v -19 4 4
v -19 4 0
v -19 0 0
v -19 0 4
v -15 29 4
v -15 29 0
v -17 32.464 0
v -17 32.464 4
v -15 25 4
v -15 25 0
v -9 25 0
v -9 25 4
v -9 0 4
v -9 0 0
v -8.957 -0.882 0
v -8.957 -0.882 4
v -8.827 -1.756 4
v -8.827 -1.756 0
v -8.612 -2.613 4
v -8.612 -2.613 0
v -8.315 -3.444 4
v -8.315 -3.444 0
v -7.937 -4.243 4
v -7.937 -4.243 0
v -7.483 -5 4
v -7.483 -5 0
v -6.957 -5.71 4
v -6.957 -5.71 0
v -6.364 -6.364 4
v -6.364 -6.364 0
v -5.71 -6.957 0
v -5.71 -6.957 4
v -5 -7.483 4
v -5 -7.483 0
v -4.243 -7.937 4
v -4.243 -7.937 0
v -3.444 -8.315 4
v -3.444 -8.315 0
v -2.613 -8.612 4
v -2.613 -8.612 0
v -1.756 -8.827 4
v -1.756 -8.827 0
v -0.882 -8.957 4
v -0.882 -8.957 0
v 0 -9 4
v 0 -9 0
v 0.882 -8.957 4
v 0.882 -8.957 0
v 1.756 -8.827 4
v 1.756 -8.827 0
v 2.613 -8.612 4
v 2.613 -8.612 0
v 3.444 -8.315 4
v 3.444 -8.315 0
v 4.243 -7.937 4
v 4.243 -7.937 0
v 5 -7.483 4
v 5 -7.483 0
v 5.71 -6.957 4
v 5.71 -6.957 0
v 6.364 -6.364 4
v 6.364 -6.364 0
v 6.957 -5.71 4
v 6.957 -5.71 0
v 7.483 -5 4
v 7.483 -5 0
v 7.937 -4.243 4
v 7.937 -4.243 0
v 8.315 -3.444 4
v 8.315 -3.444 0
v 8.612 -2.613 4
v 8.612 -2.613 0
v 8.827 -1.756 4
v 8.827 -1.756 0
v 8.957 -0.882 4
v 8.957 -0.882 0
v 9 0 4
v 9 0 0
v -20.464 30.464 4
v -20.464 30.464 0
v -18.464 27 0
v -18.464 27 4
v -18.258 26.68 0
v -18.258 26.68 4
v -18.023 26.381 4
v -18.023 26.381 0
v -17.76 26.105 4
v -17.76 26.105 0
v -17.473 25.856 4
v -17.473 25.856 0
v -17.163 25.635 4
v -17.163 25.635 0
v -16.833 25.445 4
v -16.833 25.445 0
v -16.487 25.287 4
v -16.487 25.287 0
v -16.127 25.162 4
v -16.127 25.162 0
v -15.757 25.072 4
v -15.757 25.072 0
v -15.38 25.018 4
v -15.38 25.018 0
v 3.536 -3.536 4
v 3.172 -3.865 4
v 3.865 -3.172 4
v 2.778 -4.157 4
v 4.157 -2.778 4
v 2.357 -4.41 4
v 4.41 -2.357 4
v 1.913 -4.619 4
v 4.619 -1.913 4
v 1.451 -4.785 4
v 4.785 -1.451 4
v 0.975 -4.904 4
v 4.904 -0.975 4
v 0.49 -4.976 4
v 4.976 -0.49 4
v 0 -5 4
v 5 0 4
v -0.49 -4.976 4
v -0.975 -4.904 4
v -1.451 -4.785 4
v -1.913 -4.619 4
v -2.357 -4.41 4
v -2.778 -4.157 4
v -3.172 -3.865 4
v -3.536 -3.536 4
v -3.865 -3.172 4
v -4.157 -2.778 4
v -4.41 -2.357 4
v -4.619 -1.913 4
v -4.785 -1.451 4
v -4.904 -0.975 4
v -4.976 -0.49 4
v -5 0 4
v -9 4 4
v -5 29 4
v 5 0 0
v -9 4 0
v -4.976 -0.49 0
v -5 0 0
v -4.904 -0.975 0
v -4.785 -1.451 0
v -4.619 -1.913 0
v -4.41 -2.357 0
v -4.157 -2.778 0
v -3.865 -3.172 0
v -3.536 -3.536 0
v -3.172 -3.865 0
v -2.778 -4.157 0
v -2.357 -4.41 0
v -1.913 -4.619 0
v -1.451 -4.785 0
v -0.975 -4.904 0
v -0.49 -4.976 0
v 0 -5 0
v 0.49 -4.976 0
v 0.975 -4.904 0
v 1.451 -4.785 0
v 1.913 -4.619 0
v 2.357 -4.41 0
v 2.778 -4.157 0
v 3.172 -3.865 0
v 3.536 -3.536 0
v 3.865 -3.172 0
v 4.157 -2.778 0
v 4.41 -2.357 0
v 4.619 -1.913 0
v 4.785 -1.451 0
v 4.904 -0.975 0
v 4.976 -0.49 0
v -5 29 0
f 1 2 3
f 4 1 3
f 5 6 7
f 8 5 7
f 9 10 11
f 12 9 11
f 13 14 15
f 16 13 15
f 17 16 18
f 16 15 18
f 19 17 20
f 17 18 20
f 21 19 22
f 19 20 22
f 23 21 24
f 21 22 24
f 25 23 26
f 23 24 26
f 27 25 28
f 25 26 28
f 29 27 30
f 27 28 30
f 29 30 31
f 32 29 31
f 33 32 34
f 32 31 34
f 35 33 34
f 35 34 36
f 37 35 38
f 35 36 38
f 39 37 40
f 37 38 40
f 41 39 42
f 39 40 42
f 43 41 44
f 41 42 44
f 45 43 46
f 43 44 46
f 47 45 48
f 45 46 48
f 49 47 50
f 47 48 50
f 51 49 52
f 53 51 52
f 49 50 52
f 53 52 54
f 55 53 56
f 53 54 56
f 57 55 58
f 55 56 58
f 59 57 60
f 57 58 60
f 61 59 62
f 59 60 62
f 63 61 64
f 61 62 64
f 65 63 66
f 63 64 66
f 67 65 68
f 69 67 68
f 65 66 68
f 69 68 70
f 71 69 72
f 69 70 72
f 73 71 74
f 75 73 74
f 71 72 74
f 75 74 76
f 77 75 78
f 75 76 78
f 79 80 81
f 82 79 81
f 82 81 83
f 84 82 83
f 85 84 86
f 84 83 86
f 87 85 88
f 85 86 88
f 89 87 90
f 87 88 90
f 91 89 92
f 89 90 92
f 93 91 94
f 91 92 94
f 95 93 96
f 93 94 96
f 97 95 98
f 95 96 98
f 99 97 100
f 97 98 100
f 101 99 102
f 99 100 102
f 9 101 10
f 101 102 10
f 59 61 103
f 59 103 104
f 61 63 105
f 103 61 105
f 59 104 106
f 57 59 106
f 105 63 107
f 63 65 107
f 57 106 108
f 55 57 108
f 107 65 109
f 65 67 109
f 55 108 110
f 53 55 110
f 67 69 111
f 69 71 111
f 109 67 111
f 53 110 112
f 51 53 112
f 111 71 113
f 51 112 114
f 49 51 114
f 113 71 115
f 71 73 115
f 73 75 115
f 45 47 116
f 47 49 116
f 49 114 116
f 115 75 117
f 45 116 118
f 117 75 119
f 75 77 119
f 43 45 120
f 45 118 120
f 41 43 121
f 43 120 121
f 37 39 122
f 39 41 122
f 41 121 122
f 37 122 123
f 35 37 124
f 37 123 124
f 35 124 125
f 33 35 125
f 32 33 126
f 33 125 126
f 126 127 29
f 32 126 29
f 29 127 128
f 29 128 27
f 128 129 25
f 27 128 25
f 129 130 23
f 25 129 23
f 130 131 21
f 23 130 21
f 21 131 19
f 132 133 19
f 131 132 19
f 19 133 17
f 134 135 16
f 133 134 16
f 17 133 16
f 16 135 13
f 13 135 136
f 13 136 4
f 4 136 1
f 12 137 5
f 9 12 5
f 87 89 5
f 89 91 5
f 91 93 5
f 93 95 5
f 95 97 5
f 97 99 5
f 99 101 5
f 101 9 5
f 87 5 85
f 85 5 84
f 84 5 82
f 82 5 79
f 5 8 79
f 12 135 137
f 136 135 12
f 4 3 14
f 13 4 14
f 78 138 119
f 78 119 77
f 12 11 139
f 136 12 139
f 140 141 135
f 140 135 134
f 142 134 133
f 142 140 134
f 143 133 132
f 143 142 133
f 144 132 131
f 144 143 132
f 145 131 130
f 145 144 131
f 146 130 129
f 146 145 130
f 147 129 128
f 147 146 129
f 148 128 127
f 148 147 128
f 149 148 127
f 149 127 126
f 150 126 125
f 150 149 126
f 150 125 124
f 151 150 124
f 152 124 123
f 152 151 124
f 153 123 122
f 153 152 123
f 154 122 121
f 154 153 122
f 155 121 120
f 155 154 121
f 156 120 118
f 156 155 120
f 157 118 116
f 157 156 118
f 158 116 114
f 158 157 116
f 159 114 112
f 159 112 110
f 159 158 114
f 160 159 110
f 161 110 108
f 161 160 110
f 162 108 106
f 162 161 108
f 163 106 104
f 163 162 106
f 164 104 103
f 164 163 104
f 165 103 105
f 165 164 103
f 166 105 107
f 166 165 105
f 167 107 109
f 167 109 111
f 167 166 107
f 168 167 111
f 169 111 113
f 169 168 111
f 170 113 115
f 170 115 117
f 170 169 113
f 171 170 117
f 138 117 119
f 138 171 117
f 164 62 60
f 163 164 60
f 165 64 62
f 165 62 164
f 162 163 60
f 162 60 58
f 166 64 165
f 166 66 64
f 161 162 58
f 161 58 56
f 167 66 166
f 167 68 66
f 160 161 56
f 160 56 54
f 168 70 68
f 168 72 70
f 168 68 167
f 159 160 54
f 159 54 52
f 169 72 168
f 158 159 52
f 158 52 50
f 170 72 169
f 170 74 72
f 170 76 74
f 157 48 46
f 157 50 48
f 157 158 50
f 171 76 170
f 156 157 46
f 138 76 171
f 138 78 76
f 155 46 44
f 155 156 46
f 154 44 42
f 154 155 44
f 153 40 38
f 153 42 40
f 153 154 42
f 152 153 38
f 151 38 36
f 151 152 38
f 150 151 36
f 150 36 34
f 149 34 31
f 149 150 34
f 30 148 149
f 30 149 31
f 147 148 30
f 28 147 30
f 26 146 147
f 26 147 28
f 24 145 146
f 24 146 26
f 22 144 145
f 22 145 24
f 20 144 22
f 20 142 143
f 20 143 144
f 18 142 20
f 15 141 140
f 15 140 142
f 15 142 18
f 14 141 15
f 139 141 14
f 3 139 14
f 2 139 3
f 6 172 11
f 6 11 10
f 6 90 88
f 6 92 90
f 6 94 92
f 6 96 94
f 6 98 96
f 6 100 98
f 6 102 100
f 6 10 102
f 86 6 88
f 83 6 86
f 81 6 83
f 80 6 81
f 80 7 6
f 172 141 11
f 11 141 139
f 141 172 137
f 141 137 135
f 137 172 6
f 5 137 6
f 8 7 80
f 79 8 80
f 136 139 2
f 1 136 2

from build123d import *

# Parameters (mm, degrees)
PAD_DEPTH = 4


with BuildPart() as part:
    # Sketch → Pad (new body)
    with BuildSketch(Plane.XY):
        with BuildLine():
            Line((-5, 29), (-5, 0))
            ThreePointArc((-5, 0), (0, -5), (5, 0))
            Line((5, 0), (9, 0))
            ThreePointArc((-9, 0), (0, -9), (9, 0))
            Line((-19, 0), (-9, 0))
            Line((-19, 4), (-19, 0))
            Line((-9, 4), (-19, 4))
            Line((-9, 25), (-9, 4))
            Line((-15, 25), (-9, 25))
            ThreePointArc((-18.46412, 26.999997), (-17.00001, 25.535892), (-15, 25))
            Line((-20.464122, 30.464102), (-18.46412, 26.999997))
            Line((-17.00002, 32.464102), (-20.464122, 30.464102))
            Line((-15.00002, 29), (-17.00002, 32.464102))
            Line((-5, 29), (-15.00002, 29))
        make_face()
    extrude(amount=PAD_DEPTH)


solid = part.part
